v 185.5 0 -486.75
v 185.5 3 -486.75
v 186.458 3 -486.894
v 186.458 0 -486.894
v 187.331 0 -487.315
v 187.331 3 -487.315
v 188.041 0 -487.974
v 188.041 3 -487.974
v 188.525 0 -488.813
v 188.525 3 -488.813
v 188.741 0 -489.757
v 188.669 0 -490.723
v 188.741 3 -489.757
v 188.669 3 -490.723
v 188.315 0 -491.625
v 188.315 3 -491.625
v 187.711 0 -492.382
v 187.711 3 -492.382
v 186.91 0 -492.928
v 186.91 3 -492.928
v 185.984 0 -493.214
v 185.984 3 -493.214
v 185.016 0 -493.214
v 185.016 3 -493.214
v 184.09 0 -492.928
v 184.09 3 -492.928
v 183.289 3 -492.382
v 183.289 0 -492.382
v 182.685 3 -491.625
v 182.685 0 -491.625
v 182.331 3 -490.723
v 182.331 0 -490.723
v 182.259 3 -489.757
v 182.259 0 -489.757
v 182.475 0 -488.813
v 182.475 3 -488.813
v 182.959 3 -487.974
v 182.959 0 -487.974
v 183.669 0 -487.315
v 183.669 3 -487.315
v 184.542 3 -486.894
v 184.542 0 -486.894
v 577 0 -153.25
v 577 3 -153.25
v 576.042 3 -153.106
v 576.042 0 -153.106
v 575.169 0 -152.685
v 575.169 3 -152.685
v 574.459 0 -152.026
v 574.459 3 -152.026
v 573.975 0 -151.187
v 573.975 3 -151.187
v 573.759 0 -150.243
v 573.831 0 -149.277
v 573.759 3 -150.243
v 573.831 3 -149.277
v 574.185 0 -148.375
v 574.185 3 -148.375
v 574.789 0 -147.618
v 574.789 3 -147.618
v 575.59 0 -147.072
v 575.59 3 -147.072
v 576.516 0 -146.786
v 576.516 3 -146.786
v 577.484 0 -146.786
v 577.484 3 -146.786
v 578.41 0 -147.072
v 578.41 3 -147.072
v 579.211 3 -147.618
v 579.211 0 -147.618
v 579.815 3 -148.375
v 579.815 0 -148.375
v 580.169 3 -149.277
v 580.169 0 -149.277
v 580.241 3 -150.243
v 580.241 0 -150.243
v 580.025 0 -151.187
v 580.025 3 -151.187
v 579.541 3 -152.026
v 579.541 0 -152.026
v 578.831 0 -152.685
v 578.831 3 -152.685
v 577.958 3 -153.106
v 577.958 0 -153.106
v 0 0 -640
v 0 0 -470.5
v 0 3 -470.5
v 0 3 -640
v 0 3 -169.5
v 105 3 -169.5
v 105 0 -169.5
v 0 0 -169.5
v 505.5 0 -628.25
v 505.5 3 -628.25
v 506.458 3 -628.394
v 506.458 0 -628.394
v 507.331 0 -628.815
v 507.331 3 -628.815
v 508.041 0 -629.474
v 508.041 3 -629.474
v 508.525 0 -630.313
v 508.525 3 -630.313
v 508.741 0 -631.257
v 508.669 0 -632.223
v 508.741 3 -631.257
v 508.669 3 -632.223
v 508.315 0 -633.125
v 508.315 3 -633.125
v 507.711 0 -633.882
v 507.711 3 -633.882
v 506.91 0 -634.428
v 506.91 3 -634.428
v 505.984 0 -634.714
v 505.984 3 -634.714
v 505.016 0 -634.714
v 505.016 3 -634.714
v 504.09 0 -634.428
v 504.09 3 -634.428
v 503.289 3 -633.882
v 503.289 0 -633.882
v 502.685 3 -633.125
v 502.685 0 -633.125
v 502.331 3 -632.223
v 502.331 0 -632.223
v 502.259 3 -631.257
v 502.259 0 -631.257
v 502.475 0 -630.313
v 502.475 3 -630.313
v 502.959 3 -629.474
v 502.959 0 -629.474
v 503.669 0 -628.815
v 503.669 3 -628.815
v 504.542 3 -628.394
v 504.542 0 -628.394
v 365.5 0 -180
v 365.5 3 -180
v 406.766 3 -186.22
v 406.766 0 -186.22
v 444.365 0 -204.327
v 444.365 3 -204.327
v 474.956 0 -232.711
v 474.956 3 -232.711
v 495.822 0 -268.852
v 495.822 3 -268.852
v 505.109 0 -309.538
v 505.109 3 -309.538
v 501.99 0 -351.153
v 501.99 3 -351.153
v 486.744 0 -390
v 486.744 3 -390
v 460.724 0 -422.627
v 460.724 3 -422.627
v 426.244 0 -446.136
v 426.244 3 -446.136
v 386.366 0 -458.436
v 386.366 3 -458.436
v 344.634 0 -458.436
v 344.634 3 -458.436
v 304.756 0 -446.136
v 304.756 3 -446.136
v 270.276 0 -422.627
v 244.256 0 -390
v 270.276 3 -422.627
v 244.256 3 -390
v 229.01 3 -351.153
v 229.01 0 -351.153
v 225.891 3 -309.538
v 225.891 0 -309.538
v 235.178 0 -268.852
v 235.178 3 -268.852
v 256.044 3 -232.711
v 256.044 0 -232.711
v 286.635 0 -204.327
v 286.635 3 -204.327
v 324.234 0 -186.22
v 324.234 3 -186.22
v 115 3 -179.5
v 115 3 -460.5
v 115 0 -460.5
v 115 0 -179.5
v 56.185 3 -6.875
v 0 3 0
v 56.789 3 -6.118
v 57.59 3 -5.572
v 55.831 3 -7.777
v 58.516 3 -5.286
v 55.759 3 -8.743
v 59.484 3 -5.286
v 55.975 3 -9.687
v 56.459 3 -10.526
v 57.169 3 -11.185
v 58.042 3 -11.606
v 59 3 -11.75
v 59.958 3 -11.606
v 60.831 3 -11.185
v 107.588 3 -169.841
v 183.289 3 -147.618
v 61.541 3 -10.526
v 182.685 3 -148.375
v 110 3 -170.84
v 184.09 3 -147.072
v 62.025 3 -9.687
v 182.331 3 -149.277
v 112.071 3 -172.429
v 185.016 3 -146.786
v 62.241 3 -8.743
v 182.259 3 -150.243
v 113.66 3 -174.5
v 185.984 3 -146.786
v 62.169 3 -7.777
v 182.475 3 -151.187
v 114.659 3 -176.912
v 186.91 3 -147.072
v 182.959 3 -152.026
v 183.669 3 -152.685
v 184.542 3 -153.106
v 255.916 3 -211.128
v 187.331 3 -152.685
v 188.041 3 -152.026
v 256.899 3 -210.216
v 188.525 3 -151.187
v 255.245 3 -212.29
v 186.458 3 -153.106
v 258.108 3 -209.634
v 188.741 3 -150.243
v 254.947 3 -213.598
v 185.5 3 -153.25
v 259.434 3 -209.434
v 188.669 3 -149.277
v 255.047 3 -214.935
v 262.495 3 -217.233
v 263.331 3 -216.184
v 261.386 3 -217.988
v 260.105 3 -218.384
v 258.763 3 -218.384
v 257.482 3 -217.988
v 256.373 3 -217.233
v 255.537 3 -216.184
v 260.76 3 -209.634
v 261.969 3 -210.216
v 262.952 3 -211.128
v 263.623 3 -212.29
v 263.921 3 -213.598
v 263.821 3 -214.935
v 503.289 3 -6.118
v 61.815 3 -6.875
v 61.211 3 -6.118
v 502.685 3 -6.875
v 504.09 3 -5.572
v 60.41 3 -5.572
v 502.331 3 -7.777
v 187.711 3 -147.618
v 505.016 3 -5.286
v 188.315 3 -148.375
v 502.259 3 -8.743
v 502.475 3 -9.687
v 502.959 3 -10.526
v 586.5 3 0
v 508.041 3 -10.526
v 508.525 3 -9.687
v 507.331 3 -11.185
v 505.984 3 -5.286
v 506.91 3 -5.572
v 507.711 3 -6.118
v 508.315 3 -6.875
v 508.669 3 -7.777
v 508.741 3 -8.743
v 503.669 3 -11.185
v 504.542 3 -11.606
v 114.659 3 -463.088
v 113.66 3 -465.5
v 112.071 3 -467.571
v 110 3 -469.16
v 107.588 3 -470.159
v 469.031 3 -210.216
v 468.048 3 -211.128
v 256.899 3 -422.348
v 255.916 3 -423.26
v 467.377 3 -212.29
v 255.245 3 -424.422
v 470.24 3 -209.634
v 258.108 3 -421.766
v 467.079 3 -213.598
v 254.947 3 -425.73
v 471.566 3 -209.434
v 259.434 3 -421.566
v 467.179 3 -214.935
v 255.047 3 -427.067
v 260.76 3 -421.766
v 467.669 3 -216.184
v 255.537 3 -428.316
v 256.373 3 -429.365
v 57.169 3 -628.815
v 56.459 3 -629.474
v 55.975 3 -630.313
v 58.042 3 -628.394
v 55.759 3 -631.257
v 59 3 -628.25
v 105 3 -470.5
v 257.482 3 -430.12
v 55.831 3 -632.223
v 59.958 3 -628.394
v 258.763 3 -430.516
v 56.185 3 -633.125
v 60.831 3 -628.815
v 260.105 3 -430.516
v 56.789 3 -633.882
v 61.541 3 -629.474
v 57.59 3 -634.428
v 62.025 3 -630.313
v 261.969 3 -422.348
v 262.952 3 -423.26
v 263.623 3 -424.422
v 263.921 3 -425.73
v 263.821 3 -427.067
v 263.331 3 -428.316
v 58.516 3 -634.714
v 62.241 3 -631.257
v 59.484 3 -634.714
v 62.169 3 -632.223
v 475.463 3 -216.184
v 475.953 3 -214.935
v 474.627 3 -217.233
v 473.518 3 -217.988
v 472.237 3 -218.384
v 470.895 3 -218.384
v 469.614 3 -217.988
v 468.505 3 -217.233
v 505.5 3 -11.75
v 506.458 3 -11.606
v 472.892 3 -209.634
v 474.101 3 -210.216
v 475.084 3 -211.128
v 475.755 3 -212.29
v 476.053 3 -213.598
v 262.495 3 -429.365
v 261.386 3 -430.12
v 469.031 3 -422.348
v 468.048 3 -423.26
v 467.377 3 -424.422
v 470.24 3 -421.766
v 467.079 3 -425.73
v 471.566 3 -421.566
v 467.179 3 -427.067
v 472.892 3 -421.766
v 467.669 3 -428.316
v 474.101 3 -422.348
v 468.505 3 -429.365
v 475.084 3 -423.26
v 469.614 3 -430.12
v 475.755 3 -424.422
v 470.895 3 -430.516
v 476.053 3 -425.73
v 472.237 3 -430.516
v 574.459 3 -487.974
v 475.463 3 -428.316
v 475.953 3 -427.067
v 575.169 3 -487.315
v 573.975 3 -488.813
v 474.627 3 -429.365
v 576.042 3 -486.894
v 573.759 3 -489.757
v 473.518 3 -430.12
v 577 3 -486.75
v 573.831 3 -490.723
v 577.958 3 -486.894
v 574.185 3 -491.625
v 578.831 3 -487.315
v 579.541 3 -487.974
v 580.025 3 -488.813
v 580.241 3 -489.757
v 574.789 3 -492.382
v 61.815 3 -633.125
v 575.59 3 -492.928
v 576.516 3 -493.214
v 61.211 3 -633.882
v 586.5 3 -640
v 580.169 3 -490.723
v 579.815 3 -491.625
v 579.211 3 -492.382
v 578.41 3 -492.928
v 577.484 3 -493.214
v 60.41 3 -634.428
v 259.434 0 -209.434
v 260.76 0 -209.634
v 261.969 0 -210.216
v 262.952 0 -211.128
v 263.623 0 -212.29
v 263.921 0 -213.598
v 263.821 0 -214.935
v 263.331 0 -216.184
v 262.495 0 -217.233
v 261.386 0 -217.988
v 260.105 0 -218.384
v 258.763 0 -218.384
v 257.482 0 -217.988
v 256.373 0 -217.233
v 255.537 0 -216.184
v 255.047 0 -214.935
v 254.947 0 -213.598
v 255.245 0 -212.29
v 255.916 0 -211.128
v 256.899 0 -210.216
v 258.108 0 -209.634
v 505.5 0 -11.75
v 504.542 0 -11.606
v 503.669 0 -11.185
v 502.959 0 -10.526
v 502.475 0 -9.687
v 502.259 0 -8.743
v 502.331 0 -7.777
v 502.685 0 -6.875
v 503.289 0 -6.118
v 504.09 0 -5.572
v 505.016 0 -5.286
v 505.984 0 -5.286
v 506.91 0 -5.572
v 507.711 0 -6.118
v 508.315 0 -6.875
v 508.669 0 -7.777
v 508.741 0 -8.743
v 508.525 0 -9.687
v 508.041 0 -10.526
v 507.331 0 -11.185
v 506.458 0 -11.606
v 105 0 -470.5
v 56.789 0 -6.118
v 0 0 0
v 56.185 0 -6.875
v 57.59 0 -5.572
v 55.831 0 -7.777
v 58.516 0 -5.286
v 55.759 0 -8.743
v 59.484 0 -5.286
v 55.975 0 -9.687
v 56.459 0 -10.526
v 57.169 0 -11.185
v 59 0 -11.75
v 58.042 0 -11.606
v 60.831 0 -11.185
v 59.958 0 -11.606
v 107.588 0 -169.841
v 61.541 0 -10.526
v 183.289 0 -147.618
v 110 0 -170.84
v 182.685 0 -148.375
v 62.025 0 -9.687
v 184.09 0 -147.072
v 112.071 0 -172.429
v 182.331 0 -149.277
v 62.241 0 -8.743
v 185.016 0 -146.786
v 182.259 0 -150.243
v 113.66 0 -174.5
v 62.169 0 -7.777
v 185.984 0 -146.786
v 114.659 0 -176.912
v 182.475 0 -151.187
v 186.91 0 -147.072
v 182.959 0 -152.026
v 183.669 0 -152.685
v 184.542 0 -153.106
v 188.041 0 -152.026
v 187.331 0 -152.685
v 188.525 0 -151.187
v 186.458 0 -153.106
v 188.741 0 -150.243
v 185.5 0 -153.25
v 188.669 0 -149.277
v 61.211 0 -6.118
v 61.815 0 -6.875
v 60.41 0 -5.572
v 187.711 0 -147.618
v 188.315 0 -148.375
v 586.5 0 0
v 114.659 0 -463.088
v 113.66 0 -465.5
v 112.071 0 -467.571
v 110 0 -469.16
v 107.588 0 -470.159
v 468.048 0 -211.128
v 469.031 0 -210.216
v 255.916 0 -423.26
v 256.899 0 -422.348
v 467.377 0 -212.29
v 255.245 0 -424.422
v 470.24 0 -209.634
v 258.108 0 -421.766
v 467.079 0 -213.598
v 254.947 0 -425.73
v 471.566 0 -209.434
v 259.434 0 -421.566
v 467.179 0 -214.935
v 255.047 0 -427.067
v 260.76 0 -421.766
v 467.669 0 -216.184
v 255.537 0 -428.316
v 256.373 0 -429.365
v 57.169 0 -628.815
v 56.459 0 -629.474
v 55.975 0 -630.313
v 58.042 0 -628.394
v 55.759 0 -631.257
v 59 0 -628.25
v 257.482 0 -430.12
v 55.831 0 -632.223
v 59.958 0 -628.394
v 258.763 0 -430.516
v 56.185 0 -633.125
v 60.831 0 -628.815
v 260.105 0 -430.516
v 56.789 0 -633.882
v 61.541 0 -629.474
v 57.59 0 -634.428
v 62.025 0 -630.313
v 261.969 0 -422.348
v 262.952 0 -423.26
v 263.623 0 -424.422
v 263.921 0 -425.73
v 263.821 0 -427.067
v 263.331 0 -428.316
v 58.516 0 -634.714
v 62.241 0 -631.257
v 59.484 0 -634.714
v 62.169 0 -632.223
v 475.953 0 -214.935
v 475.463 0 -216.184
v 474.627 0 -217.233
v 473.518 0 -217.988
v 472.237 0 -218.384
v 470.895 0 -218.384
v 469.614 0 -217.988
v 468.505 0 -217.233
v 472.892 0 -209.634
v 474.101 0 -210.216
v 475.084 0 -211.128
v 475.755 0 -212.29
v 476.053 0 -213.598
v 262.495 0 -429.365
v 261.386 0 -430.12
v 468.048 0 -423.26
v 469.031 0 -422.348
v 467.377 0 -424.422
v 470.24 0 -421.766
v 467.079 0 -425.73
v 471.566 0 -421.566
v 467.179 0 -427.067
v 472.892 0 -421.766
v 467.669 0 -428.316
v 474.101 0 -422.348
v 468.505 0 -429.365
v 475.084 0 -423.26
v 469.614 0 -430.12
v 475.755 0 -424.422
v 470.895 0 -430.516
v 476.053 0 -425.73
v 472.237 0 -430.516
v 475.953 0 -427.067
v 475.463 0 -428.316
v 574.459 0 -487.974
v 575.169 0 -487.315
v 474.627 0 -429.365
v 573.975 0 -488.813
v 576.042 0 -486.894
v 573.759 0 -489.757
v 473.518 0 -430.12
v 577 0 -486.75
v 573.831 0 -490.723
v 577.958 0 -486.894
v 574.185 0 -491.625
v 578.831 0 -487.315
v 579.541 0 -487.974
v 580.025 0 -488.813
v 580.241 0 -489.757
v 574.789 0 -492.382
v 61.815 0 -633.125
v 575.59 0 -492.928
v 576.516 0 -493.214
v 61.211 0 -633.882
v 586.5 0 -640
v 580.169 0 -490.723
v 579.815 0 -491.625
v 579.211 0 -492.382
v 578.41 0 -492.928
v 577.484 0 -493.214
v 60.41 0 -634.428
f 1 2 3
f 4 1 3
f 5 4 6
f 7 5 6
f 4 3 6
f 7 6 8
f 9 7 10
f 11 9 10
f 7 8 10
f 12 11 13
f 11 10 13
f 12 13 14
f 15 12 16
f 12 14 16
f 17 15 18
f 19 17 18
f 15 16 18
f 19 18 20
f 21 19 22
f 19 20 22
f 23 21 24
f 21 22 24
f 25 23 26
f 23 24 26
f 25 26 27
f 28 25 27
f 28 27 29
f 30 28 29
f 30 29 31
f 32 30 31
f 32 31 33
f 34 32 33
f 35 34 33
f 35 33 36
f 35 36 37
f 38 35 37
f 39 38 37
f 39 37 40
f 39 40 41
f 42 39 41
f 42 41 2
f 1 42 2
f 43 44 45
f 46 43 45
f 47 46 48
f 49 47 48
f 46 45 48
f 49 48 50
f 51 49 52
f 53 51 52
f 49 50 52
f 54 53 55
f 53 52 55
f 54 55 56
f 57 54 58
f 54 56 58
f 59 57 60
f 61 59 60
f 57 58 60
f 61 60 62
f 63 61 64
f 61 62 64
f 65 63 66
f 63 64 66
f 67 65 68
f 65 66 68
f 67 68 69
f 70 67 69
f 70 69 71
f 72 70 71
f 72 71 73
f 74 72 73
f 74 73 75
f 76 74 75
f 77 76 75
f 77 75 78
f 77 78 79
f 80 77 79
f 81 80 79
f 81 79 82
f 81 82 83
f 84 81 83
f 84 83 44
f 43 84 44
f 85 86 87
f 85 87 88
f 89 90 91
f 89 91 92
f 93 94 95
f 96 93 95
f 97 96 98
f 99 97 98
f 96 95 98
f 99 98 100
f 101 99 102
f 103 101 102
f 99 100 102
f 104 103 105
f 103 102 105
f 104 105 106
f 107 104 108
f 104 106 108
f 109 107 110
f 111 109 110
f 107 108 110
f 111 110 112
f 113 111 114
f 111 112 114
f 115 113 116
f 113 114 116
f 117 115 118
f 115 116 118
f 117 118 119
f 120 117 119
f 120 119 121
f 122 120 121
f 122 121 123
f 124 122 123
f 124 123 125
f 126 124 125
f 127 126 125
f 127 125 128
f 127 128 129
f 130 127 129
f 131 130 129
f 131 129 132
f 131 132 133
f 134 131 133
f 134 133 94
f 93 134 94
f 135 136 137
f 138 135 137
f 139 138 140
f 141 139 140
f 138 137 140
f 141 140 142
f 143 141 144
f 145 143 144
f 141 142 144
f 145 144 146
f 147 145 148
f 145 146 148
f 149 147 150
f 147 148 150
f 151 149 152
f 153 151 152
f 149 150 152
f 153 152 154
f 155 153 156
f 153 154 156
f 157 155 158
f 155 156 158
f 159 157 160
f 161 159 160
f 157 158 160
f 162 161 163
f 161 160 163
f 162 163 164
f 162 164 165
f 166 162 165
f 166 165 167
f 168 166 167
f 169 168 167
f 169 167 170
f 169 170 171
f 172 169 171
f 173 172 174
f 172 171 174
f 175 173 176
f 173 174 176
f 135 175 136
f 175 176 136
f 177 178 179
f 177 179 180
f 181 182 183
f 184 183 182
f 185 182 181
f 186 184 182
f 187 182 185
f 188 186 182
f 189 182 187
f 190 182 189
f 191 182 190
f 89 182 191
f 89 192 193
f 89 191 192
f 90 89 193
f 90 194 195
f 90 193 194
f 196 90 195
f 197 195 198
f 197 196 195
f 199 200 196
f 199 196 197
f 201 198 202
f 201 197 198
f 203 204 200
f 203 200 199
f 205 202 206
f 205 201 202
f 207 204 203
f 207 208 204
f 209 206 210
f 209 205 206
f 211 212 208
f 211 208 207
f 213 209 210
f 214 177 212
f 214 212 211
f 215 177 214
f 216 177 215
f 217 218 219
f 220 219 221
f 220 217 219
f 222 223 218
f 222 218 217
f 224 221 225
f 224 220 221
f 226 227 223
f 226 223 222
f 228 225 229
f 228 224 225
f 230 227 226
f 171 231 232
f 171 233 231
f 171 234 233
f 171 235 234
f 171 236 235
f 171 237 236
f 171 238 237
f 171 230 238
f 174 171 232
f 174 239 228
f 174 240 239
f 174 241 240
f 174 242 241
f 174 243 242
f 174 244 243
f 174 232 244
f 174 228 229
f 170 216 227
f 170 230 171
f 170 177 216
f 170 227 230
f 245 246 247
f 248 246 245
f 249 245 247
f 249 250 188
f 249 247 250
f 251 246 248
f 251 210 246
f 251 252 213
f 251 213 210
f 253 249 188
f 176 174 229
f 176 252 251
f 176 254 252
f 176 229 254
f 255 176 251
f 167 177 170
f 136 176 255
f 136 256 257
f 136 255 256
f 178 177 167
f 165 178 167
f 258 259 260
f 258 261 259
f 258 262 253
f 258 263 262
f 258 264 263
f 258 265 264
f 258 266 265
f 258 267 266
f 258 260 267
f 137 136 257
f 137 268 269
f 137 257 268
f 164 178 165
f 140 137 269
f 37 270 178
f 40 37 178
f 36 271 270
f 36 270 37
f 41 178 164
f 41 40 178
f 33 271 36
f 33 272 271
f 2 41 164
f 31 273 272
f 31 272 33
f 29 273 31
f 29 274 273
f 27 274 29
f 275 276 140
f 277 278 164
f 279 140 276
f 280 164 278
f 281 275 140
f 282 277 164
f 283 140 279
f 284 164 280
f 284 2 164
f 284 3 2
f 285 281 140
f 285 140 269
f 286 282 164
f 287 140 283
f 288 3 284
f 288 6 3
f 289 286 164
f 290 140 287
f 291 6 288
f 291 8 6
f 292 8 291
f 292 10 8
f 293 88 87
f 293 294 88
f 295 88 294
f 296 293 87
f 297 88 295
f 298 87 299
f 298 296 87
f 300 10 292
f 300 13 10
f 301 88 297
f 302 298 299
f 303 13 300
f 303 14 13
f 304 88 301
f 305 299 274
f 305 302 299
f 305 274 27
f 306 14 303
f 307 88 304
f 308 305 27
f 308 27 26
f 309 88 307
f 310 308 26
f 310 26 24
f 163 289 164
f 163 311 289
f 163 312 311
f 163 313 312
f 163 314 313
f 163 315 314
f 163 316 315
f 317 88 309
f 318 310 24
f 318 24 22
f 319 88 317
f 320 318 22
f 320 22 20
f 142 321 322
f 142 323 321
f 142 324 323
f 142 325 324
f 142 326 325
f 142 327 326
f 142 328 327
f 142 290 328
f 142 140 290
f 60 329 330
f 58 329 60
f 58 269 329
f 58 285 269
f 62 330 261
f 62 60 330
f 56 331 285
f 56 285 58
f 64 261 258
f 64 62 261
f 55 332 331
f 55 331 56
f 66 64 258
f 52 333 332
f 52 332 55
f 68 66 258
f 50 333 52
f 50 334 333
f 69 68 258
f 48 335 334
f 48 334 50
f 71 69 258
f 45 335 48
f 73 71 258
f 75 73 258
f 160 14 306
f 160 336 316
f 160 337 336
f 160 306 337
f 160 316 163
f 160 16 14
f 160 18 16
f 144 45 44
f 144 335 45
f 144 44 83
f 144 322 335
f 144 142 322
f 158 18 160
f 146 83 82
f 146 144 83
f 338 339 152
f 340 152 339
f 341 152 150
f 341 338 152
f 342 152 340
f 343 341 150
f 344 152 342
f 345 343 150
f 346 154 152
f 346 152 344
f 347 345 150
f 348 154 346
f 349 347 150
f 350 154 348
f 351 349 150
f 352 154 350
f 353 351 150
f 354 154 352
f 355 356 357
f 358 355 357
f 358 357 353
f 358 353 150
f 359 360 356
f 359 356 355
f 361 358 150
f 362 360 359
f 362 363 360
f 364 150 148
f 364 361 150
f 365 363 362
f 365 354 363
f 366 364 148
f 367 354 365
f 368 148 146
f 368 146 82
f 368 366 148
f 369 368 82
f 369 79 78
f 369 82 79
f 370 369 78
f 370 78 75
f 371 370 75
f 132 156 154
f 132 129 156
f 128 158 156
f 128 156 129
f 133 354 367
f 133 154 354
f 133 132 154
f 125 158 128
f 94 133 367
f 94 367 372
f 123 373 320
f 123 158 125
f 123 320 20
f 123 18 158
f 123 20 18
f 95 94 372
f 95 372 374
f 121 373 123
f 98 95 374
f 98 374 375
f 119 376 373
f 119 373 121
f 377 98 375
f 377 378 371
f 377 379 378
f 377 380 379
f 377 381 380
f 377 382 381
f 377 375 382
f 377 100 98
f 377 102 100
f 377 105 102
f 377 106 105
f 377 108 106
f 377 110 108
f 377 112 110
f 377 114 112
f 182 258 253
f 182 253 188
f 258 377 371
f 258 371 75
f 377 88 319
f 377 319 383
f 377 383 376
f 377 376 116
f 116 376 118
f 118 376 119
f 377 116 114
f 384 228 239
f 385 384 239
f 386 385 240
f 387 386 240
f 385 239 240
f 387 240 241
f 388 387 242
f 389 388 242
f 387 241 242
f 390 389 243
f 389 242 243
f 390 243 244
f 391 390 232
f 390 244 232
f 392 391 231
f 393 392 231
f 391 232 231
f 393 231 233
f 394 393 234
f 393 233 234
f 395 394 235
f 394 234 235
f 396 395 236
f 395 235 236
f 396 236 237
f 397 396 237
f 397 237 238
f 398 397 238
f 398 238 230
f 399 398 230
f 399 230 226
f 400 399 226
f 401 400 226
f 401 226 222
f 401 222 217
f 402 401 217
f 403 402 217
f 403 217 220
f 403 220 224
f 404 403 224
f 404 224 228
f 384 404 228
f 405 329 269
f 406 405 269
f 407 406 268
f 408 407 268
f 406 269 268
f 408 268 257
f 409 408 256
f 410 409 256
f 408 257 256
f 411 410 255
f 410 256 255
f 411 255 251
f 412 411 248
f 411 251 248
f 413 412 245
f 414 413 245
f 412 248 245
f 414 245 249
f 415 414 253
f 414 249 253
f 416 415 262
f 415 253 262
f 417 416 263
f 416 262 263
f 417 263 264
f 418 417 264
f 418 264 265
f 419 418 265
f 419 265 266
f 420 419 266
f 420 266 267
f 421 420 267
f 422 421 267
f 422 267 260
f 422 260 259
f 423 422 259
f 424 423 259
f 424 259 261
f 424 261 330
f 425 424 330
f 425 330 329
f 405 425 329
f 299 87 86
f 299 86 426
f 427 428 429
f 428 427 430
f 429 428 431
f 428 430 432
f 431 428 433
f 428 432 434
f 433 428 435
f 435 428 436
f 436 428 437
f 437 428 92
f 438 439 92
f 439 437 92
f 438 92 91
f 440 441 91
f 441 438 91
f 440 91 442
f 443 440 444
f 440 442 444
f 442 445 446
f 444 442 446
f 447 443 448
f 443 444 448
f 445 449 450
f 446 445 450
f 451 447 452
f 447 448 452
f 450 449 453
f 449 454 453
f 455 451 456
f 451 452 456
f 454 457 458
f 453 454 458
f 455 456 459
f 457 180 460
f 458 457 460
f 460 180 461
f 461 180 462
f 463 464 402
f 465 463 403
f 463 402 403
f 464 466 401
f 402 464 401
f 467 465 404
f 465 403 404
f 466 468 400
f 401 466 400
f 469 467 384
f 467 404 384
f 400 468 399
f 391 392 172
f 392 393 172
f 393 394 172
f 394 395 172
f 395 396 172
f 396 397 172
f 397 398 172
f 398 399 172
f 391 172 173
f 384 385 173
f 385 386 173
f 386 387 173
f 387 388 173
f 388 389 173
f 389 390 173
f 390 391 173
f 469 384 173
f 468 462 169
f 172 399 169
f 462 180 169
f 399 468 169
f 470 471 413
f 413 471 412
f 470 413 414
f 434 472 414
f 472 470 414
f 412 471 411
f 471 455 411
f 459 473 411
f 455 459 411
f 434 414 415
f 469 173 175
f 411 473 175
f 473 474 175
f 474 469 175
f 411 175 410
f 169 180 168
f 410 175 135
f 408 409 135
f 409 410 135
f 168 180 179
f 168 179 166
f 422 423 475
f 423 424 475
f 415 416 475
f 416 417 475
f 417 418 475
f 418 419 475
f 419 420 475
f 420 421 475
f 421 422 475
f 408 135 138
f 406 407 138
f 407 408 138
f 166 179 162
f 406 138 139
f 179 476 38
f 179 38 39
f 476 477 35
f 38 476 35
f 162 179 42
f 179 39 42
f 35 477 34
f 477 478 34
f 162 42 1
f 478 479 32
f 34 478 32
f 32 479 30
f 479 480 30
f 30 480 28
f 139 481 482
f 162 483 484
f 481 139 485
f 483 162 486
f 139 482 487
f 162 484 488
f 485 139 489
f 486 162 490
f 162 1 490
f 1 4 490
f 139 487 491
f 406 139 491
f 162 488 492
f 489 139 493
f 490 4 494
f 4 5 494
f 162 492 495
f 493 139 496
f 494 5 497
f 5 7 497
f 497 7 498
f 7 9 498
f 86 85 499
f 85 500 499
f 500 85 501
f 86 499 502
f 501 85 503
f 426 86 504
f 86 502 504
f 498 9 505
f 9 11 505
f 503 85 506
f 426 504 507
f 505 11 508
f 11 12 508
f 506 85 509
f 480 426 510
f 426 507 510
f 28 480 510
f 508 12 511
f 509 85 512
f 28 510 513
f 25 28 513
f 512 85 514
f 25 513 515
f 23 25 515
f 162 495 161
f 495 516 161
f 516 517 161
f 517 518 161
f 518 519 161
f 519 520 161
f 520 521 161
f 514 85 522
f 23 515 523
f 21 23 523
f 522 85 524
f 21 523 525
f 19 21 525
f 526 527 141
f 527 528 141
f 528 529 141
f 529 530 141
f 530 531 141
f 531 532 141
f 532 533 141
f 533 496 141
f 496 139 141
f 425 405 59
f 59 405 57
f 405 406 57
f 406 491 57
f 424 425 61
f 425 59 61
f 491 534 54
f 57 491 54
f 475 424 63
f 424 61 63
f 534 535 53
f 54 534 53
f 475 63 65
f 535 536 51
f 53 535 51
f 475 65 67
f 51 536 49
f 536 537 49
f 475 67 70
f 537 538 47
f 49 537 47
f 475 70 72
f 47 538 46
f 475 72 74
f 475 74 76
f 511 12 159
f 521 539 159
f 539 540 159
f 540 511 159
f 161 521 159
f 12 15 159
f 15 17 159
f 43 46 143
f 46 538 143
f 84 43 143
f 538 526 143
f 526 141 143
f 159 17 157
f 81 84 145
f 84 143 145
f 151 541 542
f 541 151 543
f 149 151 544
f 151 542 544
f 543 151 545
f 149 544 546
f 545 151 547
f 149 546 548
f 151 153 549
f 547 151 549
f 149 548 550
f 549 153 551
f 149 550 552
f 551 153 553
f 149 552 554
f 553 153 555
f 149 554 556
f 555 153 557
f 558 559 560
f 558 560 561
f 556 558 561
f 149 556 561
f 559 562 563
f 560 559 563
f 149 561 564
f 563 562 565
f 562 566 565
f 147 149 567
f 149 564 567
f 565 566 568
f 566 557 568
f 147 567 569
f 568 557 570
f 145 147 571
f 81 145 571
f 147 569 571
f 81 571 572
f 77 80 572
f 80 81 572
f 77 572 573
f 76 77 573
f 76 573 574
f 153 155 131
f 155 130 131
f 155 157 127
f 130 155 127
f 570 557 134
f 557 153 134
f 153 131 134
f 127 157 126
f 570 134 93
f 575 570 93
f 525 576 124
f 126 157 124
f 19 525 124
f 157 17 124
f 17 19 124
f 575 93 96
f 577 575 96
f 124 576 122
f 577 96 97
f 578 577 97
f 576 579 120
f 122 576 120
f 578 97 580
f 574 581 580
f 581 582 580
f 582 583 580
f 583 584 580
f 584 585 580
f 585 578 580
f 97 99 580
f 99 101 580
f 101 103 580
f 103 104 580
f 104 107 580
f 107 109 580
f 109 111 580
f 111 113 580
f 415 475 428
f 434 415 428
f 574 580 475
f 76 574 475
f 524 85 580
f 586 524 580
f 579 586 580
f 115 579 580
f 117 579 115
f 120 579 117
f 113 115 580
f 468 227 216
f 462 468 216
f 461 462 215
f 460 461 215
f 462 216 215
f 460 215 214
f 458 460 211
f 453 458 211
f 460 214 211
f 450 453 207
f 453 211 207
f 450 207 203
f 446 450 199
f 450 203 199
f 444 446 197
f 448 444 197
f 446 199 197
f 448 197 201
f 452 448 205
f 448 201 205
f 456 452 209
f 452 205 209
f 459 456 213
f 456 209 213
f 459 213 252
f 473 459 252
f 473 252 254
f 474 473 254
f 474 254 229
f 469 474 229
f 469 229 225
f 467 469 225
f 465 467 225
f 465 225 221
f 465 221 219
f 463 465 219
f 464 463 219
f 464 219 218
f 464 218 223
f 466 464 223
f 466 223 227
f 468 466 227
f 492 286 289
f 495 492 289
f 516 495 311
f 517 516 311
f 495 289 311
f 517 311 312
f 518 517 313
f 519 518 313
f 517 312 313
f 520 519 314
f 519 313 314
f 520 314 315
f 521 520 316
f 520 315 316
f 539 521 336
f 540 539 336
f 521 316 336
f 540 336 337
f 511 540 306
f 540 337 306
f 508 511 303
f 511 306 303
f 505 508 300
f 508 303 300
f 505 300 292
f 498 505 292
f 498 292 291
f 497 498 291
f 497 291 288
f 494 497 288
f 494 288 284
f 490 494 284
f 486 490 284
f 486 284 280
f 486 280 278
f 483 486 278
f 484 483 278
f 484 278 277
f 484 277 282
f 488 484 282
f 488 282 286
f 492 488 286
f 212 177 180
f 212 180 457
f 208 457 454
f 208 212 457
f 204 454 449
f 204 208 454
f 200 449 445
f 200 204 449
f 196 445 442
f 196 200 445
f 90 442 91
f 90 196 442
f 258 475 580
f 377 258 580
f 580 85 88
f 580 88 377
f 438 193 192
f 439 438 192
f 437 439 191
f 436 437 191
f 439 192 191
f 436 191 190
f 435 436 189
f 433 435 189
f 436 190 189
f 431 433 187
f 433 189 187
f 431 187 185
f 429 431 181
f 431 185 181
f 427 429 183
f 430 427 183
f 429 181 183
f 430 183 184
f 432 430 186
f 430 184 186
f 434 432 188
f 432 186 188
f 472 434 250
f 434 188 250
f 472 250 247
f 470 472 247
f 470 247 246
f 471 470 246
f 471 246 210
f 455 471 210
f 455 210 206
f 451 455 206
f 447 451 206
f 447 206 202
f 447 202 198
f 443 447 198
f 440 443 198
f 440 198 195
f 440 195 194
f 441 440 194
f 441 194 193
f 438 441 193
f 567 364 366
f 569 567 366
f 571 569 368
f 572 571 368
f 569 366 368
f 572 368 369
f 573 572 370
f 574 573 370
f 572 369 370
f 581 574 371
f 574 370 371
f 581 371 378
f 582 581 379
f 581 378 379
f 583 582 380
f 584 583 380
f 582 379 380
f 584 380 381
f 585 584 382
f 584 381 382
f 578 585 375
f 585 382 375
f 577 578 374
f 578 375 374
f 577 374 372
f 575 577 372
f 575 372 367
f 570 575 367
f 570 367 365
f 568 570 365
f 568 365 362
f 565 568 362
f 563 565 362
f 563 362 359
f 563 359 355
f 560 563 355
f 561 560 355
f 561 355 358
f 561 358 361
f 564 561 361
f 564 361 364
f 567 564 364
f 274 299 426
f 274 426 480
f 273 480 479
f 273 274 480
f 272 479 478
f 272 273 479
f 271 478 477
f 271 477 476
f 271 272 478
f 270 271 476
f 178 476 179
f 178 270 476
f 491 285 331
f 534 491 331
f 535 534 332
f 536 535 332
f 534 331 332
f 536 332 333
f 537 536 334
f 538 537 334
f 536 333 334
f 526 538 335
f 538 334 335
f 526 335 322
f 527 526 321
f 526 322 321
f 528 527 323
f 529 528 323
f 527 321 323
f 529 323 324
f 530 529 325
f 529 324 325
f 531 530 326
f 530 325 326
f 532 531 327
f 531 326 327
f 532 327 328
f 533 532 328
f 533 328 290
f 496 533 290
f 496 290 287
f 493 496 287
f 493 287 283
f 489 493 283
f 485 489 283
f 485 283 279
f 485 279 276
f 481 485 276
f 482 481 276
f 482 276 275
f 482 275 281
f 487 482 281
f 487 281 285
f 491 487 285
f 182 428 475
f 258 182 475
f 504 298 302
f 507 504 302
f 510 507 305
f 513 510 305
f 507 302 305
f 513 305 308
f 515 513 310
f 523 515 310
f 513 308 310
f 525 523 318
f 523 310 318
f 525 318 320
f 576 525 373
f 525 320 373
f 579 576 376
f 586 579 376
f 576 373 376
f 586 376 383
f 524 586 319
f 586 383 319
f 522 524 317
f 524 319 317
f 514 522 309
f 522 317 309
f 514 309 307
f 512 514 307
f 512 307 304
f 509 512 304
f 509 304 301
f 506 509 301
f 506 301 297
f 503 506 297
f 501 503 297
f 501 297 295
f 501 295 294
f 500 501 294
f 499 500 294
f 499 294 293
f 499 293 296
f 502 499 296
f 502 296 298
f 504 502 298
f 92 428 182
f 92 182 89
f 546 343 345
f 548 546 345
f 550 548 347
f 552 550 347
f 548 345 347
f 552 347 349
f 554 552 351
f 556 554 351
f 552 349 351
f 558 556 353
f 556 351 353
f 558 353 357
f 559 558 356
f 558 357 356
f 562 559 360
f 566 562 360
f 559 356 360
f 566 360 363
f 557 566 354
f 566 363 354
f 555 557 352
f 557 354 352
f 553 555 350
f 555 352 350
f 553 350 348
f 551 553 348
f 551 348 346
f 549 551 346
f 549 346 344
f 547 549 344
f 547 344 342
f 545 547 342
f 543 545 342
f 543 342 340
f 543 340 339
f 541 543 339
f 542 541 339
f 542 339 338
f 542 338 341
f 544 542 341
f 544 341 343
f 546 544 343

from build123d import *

# Parameters (mm, degrees)
SKETCH_1_W          = 586.5
SKETCH_1_H          = 640
EXTRUDE_1_DEPTH     = 3
CUT_EXTRUDE_1_DEPTH = 3
SKETCH_3_R          = 140
CUT_EXTRUDE_2_DEPTH = 3
SKETCH_4_R          = 4.5
CUT_EXTRUDE_3_DEPTH = 869.09633682
SKETCH_5_R          = 3.25
CUT_EXTRUDE_4_DEPTH = 869.09633682


with BuildPart() as part:
    # 스케치1 → 보스-돌출1 (new body)
    with BuildSketch(Plane(origin=(0, 0, 0), x_dir=(1, 0, 0), z_dir=(0, 1, 0))):
        with Locations((293.25, 320)):
            Rectangle(SKETCH_1_W, SKETCH_1_H)
    extrude(amount=EXTRUDE_1_DEPTH)

    # 스케치2 → 컷-돌출1 (cut)
    with BuildSketch(Plane(origin=(0, 3, 0), x_dir=(1, 0, 0), z_dir=(0, 1, 0))):
        with BuildLine():
            Line((0, 470.5), (105, 470.5))
            ThreePointArc((105, 470.5), (112.071067812, 467.571067812), (115, 460.5))
            Line((115, 460.5), (115, 179.5))
            ThreePointArc((115, 179.5), (112.071067812, 172.428932188), (105, 169.5))
            Line((105, 169.5), (0, 169.5))
            Line((0, 169.5), (0, 470.5))
        make_face()
    extrude(amount=-CUT_EXTRUDE_1_DEPTH, mode=Mode.SUBTRACT)

    # 스케치3 → 컷-돌출2 (cut)
    with BuildSketch(Plane(origin=(0, 3, 0), x_dir=(1, 0, 0), z_dir=(0, 1, 0))):
        with Locations(Location((365.5, 320, 0), (0, 0, 270))):
            Circle(SKETCH_3_R)
    extrude(amount=-CUT_EXTRUDE_2_DEPTH, mode=Mode.SUBTRACT)

    # 스케치4 → 컷-돌출3 (cut, through all)
    with BuildSketch(Plane(origin=(0, 3, 0), x_dir=(1, 0, 0), z_dir=(0, 1, 0))):
        with Locations(Location((259.433982822, 426.066017178, 0), (0, 0, 270))):
            Circle(SKETCH_4_R)
        with Locations(Location((471.566017178, 426.066017178, 0), (0, 0, 270))):
            Circle(SKETCH_4_R)
        with Locations(Location((471.566017178, 213.933982822, 0), (0, 0, 270))):
            Circle(SKETCH_4_R)
        with Locations(Location((259.433982822, 213.933982822, 0), (0, 0, 270))):
            Circle(SKETCH_4_R)
    extrude(amount=-CUT_EXTRUDE_3_DEPTH, mode=Mode.SUBTRACT)

    # 스케치5 → 컷-돌출4 (cut, through all)
    with BuildSketch(Plane(origin=(0, 3, 0), x_dir=(1, 0, 0), z_dir=(0, 1, 0))):
        with Locations(Location((59, 631.5, 0), (0, 0, 270))):
            Circle(SKETCH_5_R)
        with Locations(Location((505.5, 631.5, 0), (0, 0, 270))):
            Circle(SKETCH_5_R)
        with Locations(Location((185.5, 490, 0), (0, 0, 270))):
            Circle(SKETCH_5_R)
        with Locations(Location((577, 490, 0), (0, 0, 270))):
            Circle(SKETCH_5_R)
        with Locations(Location((577, 150, 0), (0, 0, 90))):
            Circle(SKETCH_5_R)
        with Locations(Location((185.5, 150, 0), (0, 0, 90))):
            Circle(SKETCH_5_R)
        with Locations(Location((505.5, 8.5, 0), (0, 0, 90))):
            Circle(SKETCH_5_R)
        with Locations(Location((59, 8.5, 0), (0, 0, 90))):
            Circle(SKETCH_5_R)
    extrude(amount=-CUT_EXTRUDE_4_DEPTH, mode=Mode.SUBTRACT)


solid = part.part
